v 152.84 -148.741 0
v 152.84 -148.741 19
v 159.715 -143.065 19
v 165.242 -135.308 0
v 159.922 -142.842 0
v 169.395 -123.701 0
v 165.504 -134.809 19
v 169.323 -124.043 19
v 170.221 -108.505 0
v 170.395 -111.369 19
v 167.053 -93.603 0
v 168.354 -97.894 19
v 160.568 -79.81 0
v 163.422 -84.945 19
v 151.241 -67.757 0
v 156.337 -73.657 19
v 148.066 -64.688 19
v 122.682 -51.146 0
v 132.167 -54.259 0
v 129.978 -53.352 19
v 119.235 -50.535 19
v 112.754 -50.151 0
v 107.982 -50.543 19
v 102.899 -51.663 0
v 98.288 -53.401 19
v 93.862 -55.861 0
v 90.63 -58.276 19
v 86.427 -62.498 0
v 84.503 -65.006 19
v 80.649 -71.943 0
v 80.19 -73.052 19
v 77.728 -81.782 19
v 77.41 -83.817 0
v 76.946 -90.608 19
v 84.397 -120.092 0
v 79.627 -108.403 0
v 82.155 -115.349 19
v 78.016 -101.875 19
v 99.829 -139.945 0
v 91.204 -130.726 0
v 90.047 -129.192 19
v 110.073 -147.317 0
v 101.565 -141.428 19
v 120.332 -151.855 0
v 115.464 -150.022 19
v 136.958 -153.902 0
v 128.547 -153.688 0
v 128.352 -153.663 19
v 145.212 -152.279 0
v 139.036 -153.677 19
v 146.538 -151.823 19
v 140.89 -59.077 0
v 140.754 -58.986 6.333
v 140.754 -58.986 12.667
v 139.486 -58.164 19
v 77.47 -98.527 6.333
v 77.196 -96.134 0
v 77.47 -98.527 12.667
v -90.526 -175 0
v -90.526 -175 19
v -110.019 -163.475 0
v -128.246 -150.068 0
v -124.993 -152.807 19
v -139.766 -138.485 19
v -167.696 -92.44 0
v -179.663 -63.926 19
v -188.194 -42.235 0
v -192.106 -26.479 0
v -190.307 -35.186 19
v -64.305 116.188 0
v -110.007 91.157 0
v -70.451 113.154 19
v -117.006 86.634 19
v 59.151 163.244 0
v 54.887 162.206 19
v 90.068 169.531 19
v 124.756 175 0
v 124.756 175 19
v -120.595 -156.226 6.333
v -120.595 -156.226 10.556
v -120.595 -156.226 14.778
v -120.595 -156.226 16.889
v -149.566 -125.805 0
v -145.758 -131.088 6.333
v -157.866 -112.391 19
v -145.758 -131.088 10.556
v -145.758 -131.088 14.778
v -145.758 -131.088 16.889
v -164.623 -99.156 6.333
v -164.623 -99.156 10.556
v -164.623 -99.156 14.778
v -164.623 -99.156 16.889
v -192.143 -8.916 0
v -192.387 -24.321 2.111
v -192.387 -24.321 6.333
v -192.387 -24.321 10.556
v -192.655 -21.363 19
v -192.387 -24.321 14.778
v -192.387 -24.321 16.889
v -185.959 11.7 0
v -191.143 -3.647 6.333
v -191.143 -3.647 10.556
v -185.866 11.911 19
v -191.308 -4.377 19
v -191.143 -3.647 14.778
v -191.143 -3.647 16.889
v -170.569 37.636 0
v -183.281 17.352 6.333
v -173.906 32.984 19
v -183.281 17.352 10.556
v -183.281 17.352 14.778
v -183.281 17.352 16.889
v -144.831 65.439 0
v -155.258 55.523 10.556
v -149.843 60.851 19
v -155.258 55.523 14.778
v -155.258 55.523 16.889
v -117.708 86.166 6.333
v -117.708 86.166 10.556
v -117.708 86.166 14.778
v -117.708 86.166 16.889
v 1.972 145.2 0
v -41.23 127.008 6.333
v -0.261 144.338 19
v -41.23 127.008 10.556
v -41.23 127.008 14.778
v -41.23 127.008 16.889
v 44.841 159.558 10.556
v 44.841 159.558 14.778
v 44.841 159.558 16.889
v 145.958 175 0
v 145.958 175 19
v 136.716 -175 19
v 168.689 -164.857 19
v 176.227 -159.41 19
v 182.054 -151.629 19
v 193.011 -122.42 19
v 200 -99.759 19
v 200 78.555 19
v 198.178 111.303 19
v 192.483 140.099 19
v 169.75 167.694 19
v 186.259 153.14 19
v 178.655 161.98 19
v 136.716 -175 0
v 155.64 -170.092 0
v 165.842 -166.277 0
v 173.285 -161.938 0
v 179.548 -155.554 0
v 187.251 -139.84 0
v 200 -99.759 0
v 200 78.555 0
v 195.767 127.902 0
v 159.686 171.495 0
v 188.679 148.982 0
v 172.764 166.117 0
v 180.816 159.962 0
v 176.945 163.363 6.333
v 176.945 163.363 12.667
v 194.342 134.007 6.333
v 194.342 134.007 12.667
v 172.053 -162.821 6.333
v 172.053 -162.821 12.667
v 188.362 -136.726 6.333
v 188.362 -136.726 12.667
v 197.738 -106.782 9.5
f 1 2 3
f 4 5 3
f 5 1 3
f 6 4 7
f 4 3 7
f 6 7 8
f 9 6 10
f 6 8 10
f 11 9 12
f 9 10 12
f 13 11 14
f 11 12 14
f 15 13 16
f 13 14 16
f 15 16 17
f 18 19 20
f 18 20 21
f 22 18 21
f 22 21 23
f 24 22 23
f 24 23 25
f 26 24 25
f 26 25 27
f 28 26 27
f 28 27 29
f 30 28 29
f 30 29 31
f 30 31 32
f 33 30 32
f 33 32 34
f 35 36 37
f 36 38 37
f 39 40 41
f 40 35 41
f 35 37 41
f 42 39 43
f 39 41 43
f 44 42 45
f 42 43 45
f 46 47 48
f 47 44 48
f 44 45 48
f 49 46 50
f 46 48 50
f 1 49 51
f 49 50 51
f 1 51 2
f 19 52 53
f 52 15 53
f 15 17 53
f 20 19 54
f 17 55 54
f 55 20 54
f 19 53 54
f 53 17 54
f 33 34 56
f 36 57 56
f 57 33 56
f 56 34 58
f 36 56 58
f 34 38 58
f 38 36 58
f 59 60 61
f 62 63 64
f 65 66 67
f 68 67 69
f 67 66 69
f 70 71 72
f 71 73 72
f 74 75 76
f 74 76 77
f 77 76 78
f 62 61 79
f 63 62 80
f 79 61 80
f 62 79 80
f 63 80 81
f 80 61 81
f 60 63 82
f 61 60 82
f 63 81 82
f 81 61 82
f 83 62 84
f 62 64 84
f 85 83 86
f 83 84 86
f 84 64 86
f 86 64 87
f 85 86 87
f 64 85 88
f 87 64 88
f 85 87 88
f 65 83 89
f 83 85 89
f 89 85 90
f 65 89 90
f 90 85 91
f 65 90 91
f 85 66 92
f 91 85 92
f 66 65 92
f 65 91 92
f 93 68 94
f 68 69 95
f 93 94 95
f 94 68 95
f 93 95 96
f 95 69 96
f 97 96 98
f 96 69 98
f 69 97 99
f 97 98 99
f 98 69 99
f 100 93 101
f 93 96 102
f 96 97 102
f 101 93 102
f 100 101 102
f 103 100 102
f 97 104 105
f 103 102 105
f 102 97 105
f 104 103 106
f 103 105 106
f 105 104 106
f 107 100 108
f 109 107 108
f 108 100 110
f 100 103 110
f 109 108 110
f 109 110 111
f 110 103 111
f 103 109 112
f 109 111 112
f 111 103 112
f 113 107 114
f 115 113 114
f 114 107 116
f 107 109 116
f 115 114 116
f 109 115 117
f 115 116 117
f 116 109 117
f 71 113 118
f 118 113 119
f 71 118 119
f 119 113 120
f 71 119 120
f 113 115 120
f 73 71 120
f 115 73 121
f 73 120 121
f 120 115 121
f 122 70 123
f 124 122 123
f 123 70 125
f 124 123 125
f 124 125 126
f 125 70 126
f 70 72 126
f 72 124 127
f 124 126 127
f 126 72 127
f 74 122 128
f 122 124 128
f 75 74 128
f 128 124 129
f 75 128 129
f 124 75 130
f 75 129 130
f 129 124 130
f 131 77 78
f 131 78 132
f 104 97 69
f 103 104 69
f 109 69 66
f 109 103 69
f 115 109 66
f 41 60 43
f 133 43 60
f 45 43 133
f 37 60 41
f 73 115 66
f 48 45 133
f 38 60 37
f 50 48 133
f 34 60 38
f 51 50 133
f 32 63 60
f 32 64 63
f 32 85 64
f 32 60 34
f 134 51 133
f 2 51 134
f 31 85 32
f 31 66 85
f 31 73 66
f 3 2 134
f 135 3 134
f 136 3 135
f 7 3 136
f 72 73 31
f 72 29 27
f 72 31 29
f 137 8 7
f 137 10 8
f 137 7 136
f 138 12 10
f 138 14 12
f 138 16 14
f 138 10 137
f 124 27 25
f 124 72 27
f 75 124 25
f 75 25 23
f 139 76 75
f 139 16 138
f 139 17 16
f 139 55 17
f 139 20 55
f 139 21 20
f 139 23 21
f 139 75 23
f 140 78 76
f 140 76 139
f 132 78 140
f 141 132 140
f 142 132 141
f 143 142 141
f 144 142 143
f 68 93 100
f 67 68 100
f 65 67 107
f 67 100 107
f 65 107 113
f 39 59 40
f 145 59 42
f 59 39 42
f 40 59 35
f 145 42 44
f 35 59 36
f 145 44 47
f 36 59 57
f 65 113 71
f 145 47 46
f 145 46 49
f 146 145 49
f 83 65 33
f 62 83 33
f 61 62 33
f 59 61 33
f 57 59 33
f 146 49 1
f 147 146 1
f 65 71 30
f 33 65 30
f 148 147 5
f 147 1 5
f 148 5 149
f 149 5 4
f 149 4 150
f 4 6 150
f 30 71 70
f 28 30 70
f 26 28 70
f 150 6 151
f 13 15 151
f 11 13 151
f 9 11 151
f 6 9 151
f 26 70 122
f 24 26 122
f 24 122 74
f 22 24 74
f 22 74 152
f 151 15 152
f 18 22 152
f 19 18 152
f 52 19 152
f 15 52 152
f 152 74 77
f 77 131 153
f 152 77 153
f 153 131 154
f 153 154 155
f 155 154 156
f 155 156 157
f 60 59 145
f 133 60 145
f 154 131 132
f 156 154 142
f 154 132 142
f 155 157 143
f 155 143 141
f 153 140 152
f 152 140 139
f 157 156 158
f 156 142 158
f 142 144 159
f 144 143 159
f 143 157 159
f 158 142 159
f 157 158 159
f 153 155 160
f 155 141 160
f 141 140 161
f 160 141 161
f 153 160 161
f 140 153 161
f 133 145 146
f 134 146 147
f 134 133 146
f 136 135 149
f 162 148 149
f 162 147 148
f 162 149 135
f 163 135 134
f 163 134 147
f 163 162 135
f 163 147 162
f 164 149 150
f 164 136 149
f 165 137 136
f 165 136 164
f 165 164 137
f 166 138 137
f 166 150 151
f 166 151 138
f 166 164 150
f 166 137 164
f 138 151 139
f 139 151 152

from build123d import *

# Parameters (mm, degrees)
F0_W     = 400
F0_H     = 350
F1_DEPTH = 19
F3_DEPTH = 19.001
F4_DEPTH = 19.0010001
F5_DEPTH = 19.0010001
F6_DEPTH = 19.0010001


with BuildPart() as f1:
    # F0 (on Top) → F1 (new body)
    with BuildSketch(Plane.XY):
        Rectangle(F0_W, F0_H)
    extrude(amount=F1_DEPTH)

    # F2 (on face) → F3 (cut, through all)
    with BuildSketch(Plane.XY.offset(19)):
        with BuildLine():
            add(Edge.make_bspline(
                [(152.8396010399, -148.7412303686), (216.1242403951, -109.1998705066), (140.7543141826, -58.9859616655), (65.38438797, -8.7720528245), (77.4696748273, -98.5273215276), (89.5549616846, -188.2825902307), (152.8396010399, -148.7412303686)],
                knots=[0, 0, 0, 2.0943951024, 2.0943951024, 4.1887902048, 4.1887902048, 6.2831853072, 6.2831853072, 6.2831853072], degree=2, weights=[1, 0.5, 1, 0.5, 1, 0.5, 1]))
        make_face()
        with BuildLine():
            Line((-200, -175), (-90.526111424, -175))
            add(Edge.make_bspline(
                [(-90.526111424, -175), (-103.8382685329, -167.4219505571), (-130.7476441047, -152.1035782684), (-160.2179153869, -113.0041133944), (-179.1350797652, -64.0107909146), (-201.1973124328, -14.6085460662), (-170.9775737898, 44.1821535107), (-118.5196742107, 89.26889049), (-43.9693923119, 127.1515212), (43.7289003313, 162.9187394455), (98.4420131893, 171.0765702578), (124.7557550669, 175)],
                knots=[0, 0, 0, 0, 0.093825449, 0.1896600397, 0.2907935652, 0.3896043383, 0.4970656848, 0.612322755, 0.7395214544, 0.8747253655, 1, 1, 1, 1], degree=3))
            Line((124.7557550669, 175), (-200, 175))
            Line((-200, 175), (-200, -175))
        make_face()
    extrude(amount=-F3_DEPTH, mode=Mode.SUBTRACT)

    # F2 (on face) → F4 (cut, through all)
    with BuildSketch(Plane.XY.offset(19)):
        with BuildLine():
            add(Edge.make_bspline(
                [(145.9577679634, 175), (157.2542816099, 172.3680174619), (180.0206535737, 167.0636646908), (198.0698354585, 133.3686007913), (199.3063042805, 98.2551615621), (200, 78.5554796457)],
                knots=[0, 0, 0, 0, 0.3018398528, 0.6083114292, 1, 1, 1, 1], degree=3))
            Line((200, 78.5554796457), (200, 175))
            Line((200, 175), (145.9577679634, 175))
        make_face()
    extrude(amount=-F4_DEPTH, mode=Mode.SUBTRACT)

    # F2 (on face) → F5 (cut, through all)
    with BuildSketch(Plane.XY.offset(19)):
        with BuildLine():
            add(Edge.make_bspline(
                [(136.7158591747, -175), (150.0790380051, -171.8445438862), (175.5674379653, -165.8259514162), (188.1410879475, -141.4578501721), (199.558189704, -99.9470767575), (200, -99.7587963939)],
                knots=[0, 0, 0, 0, 0.3282721453, 0.6261333355, 0.960409863, 0.960409863, 0.960409863, 0.960409863], degree=3))
            Line((136.7158591747, -175), (200, -175))
            Line((200, -175), (200, -100.3024280071))
            Line((200, -100.3024280071), (200, -99.7587963939))
        make_face()
    extrude(amount=-F5_DEPTH, mode=Mode.SUBTRACT)

    # F2 (on face) → F6 (cut, through all)
    with BuildSketch(Plane.XY.offset(19)):
        with BuildLine():
            add(Edge.make_bspline(
                [(152.8396010399, -148.7412303686), (216.1242403951, -109.1998705066), (140.7543141826, -58.9859616655), (65.38438797, -8.7720528245), (77.4696748273, -98.5273215276), (89.5549616846, -188.2825902307), (152.8396010399, -148.7412303686)],
                knots=[0, 0, 0, 2.0943951024, 2.0943951024, 4.1887902048, 4.1887902048, 6.2831853072, 6.2831853072, 6.2831853072], degree=2, weights=[1, 0.5, 1, 0.5, 1, 0.5, 1]))
        make_face()
    extrude(amount=-F6_DEPTH, mode=Mode.SUBTRACT)


solid = f1.part
